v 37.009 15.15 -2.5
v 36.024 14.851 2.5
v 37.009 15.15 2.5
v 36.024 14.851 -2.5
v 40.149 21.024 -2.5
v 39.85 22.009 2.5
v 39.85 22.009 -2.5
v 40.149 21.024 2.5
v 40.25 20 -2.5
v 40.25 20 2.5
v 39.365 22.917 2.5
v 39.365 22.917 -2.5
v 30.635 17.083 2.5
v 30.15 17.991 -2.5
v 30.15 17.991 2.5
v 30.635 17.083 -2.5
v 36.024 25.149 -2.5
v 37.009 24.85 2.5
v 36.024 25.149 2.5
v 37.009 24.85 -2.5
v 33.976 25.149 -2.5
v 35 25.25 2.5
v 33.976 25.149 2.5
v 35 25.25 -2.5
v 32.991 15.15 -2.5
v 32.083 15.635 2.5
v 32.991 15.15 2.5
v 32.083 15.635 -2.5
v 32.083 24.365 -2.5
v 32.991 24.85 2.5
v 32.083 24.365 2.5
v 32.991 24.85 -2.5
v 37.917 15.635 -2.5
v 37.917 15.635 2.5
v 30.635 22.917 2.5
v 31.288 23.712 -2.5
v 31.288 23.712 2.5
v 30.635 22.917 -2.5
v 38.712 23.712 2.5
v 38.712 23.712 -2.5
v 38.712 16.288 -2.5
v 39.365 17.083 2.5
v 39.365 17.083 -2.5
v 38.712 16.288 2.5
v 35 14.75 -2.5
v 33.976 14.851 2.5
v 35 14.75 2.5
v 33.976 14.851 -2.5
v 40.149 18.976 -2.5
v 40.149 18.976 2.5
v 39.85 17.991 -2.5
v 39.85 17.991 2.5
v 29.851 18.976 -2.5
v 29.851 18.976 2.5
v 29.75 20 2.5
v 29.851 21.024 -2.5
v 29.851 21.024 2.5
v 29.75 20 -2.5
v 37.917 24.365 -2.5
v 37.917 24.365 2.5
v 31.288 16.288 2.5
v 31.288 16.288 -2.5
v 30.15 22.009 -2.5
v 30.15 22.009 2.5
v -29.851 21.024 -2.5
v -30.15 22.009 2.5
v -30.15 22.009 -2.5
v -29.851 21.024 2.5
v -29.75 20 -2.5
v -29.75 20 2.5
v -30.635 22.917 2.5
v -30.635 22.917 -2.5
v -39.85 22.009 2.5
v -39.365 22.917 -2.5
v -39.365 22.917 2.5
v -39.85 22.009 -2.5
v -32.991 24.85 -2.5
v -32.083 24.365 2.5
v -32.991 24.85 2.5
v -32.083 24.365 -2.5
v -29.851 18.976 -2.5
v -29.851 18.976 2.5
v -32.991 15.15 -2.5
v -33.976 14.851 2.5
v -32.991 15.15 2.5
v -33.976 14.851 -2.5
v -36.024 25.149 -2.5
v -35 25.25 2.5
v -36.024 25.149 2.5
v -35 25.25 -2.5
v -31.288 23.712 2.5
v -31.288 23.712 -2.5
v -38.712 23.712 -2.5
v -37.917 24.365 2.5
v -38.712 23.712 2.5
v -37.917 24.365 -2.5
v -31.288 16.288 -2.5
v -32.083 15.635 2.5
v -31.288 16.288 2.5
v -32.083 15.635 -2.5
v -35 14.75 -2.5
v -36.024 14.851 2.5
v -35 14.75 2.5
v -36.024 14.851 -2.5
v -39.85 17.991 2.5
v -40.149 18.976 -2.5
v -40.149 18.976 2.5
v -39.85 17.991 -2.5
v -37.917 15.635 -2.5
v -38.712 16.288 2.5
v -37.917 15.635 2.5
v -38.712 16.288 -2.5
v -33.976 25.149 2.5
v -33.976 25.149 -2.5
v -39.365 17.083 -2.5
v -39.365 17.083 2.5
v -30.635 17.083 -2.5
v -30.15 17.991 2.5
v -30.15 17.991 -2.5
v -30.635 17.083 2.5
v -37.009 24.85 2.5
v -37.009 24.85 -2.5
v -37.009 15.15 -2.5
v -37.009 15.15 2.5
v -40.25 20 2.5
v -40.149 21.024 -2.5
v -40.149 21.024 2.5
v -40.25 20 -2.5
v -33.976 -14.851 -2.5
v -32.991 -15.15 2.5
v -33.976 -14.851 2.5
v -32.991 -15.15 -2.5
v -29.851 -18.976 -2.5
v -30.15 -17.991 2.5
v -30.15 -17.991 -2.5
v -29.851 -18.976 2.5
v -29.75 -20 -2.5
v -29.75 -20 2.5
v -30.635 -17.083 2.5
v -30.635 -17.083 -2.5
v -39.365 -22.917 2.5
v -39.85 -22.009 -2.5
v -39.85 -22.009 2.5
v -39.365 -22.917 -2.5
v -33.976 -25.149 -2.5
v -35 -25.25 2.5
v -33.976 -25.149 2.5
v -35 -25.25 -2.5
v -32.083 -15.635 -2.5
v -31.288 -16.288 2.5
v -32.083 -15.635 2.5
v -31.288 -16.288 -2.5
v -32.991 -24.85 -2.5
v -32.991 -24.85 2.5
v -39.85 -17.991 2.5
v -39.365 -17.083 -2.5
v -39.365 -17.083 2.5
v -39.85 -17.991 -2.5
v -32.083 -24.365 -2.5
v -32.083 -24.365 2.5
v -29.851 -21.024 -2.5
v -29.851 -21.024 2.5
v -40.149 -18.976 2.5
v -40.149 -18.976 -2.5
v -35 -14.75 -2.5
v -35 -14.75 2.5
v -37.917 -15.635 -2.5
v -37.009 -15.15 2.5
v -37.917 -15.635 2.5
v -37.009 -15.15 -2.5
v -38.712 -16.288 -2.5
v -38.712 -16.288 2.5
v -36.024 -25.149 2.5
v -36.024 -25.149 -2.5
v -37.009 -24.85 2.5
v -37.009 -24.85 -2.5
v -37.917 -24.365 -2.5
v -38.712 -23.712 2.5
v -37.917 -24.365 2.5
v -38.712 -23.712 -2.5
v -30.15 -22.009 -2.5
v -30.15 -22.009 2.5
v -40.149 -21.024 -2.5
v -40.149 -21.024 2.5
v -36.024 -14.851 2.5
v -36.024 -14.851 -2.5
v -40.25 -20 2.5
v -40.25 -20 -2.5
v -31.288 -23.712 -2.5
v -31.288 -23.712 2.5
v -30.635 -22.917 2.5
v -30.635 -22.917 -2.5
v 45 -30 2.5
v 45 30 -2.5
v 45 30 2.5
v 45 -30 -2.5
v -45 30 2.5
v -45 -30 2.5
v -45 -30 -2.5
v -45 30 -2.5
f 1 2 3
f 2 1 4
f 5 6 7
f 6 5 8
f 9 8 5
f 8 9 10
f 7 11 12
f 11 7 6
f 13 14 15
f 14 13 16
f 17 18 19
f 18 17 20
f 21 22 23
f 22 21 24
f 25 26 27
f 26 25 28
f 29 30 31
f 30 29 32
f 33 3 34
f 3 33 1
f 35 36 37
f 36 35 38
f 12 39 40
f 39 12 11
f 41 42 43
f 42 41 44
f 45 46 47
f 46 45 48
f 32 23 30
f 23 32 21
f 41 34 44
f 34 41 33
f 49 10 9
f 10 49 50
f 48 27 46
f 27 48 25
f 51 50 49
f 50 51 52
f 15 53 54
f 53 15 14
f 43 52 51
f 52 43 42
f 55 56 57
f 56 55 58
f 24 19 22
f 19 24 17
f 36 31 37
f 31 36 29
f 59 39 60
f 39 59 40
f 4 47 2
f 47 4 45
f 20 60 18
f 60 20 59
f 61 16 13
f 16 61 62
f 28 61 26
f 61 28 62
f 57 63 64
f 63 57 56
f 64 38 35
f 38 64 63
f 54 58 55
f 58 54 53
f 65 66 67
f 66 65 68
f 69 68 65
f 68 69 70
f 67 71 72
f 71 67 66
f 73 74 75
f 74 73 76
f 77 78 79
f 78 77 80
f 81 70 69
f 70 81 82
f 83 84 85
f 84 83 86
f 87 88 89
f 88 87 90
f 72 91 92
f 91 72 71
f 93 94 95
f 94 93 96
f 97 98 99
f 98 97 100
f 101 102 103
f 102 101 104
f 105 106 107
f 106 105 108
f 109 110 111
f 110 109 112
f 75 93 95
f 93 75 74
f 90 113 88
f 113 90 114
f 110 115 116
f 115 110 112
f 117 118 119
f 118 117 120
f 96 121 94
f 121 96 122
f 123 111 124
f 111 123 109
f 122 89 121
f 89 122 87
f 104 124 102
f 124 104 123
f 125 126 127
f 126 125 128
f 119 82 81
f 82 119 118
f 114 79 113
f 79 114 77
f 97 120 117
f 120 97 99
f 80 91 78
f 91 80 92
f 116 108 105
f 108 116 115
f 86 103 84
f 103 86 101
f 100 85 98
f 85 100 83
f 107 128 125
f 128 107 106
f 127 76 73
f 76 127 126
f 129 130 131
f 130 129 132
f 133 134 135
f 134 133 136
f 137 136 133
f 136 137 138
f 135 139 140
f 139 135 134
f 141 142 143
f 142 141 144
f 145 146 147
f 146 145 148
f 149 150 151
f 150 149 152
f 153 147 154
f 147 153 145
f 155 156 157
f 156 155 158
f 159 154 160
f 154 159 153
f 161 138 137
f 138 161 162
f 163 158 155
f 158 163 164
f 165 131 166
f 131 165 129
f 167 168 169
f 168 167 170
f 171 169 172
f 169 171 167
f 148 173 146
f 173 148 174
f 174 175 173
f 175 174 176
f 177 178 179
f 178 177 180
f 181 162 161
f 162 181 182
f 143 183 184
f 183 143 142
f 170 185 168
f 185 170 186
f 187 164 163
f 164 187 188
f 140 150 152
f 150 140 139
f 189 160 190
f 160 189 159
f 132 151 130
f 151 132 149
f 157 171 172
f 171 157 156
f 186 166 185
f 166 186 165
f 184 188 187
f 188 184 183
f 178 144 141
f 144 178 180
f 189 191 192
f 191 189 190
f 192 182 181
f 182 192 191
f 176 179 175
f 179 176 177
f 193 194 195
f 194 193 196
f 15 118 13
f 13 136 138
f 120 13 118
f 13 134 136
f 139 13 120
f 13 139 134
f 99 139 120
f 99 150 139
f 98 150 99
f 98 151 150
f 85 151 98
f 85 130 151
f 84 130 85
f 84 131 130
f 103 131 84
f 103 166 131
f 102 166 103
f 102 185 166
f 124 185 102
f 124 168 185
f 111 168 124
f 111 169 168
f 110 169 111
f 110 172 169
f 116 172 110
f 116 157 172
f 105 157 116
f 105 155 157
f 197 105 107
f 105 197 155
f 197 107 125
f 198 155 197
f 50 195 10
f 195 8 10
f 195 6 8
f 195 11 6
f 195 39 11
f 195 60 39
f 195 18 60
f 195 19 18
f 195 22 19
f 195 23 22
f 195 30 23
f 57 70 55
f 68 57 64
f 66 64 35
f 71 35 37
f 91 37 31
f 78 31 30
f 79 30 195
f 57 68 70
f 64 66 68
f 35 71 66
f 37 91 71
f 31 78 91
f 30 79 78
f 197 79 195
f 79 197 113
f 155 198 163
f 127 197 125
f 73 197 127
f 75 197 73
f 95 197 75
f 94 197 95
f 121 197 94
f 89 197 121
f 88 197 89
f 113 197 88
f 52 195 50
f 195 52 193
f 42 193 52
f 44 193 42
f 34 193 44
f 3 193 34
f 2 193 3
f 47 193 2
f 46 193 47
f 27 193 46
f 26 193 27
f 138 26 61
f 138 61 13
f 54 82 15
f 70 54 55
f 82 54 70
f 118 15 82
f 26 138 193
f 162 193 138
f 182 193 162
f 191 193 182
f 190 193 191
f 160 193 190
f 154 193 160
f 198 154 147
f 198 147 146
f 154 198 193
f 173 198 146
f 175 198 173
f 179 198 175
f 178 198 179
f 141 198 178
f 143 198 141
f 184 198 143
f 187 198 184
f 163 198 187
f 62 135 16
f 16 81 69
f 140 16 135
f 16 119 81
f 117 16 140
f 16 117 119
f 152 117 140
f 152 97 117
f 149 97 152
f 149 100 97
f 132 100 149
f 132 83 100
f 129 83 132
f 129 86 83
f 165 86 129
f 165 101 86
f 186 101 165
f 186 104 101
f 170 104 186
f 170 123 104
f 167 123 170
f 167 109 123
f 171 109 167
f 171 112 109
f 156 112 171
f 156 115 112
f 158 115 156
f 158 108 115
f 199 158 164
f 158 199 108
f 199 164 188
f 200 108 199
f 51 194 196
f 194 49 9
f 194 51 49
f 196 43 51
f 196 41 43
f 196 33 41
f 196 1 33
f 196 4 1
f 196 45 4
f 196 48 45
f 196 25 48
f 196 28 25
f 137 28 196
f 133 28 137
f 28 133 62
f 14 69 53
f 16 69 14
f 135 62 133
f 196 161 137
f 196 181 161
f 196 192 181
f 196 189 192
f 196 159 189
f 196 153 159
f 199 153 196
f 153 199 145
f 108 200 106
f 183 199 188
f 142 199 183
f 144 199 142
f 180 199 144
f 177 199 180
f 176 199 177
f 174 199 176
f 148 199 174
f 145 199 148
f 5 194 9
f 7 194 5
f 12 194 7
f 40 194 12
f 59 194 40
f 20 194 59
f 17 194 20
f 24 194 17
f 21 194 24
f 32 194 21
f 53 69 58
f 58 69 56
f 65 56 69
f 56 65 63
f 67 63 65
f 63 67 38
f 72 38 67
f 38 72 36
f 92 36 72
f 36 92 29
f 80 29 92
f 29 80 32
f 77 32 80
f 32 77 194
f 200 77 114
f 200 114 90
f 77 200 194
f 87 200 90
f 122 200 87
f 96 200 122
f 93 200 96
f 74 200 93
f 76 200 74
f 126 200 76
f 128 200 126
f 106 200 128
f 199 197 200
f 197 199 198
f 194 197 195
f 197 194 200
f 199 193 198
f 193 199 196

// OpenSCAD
$fn = 32;

// ----------------------------------------------------------------------
// Corner plate 90 x 60 x 5
// 3 holes, centres taken from the edge offset
// ----------------------------------------------------------------------

// --- parameters (mm) ---
plate = [90, 60, 5];  // overall size (x, y, z)
holes = 3;            // number of holes the drawing asks for
hole_d = 10.5;        // hole diameter
edge = 10;            // hole centre offset from the plate edge

// --- derived feature positions (mm) ---
corner_x = plate[0] / 2 - edge;  // = 35   corner hole X
corner_y = plate[1] / 2 - edge;  // = 20   corner hole Y
feature_centers = [
  [corner_x, corner_y],
  [-corner_x, corner_y],
  [-corner_x, -corner_y]
];   // hole centres the loop below drills

// plate outline, every hole drilled through with the same cutters
difference() {
  cube(plate, center = true);
  for (centre = feature_centers)
    translate([centre[0], centre[1], 0])
      cylinder(d = hole_d, h = plate[2] + 2, center = true);
}
